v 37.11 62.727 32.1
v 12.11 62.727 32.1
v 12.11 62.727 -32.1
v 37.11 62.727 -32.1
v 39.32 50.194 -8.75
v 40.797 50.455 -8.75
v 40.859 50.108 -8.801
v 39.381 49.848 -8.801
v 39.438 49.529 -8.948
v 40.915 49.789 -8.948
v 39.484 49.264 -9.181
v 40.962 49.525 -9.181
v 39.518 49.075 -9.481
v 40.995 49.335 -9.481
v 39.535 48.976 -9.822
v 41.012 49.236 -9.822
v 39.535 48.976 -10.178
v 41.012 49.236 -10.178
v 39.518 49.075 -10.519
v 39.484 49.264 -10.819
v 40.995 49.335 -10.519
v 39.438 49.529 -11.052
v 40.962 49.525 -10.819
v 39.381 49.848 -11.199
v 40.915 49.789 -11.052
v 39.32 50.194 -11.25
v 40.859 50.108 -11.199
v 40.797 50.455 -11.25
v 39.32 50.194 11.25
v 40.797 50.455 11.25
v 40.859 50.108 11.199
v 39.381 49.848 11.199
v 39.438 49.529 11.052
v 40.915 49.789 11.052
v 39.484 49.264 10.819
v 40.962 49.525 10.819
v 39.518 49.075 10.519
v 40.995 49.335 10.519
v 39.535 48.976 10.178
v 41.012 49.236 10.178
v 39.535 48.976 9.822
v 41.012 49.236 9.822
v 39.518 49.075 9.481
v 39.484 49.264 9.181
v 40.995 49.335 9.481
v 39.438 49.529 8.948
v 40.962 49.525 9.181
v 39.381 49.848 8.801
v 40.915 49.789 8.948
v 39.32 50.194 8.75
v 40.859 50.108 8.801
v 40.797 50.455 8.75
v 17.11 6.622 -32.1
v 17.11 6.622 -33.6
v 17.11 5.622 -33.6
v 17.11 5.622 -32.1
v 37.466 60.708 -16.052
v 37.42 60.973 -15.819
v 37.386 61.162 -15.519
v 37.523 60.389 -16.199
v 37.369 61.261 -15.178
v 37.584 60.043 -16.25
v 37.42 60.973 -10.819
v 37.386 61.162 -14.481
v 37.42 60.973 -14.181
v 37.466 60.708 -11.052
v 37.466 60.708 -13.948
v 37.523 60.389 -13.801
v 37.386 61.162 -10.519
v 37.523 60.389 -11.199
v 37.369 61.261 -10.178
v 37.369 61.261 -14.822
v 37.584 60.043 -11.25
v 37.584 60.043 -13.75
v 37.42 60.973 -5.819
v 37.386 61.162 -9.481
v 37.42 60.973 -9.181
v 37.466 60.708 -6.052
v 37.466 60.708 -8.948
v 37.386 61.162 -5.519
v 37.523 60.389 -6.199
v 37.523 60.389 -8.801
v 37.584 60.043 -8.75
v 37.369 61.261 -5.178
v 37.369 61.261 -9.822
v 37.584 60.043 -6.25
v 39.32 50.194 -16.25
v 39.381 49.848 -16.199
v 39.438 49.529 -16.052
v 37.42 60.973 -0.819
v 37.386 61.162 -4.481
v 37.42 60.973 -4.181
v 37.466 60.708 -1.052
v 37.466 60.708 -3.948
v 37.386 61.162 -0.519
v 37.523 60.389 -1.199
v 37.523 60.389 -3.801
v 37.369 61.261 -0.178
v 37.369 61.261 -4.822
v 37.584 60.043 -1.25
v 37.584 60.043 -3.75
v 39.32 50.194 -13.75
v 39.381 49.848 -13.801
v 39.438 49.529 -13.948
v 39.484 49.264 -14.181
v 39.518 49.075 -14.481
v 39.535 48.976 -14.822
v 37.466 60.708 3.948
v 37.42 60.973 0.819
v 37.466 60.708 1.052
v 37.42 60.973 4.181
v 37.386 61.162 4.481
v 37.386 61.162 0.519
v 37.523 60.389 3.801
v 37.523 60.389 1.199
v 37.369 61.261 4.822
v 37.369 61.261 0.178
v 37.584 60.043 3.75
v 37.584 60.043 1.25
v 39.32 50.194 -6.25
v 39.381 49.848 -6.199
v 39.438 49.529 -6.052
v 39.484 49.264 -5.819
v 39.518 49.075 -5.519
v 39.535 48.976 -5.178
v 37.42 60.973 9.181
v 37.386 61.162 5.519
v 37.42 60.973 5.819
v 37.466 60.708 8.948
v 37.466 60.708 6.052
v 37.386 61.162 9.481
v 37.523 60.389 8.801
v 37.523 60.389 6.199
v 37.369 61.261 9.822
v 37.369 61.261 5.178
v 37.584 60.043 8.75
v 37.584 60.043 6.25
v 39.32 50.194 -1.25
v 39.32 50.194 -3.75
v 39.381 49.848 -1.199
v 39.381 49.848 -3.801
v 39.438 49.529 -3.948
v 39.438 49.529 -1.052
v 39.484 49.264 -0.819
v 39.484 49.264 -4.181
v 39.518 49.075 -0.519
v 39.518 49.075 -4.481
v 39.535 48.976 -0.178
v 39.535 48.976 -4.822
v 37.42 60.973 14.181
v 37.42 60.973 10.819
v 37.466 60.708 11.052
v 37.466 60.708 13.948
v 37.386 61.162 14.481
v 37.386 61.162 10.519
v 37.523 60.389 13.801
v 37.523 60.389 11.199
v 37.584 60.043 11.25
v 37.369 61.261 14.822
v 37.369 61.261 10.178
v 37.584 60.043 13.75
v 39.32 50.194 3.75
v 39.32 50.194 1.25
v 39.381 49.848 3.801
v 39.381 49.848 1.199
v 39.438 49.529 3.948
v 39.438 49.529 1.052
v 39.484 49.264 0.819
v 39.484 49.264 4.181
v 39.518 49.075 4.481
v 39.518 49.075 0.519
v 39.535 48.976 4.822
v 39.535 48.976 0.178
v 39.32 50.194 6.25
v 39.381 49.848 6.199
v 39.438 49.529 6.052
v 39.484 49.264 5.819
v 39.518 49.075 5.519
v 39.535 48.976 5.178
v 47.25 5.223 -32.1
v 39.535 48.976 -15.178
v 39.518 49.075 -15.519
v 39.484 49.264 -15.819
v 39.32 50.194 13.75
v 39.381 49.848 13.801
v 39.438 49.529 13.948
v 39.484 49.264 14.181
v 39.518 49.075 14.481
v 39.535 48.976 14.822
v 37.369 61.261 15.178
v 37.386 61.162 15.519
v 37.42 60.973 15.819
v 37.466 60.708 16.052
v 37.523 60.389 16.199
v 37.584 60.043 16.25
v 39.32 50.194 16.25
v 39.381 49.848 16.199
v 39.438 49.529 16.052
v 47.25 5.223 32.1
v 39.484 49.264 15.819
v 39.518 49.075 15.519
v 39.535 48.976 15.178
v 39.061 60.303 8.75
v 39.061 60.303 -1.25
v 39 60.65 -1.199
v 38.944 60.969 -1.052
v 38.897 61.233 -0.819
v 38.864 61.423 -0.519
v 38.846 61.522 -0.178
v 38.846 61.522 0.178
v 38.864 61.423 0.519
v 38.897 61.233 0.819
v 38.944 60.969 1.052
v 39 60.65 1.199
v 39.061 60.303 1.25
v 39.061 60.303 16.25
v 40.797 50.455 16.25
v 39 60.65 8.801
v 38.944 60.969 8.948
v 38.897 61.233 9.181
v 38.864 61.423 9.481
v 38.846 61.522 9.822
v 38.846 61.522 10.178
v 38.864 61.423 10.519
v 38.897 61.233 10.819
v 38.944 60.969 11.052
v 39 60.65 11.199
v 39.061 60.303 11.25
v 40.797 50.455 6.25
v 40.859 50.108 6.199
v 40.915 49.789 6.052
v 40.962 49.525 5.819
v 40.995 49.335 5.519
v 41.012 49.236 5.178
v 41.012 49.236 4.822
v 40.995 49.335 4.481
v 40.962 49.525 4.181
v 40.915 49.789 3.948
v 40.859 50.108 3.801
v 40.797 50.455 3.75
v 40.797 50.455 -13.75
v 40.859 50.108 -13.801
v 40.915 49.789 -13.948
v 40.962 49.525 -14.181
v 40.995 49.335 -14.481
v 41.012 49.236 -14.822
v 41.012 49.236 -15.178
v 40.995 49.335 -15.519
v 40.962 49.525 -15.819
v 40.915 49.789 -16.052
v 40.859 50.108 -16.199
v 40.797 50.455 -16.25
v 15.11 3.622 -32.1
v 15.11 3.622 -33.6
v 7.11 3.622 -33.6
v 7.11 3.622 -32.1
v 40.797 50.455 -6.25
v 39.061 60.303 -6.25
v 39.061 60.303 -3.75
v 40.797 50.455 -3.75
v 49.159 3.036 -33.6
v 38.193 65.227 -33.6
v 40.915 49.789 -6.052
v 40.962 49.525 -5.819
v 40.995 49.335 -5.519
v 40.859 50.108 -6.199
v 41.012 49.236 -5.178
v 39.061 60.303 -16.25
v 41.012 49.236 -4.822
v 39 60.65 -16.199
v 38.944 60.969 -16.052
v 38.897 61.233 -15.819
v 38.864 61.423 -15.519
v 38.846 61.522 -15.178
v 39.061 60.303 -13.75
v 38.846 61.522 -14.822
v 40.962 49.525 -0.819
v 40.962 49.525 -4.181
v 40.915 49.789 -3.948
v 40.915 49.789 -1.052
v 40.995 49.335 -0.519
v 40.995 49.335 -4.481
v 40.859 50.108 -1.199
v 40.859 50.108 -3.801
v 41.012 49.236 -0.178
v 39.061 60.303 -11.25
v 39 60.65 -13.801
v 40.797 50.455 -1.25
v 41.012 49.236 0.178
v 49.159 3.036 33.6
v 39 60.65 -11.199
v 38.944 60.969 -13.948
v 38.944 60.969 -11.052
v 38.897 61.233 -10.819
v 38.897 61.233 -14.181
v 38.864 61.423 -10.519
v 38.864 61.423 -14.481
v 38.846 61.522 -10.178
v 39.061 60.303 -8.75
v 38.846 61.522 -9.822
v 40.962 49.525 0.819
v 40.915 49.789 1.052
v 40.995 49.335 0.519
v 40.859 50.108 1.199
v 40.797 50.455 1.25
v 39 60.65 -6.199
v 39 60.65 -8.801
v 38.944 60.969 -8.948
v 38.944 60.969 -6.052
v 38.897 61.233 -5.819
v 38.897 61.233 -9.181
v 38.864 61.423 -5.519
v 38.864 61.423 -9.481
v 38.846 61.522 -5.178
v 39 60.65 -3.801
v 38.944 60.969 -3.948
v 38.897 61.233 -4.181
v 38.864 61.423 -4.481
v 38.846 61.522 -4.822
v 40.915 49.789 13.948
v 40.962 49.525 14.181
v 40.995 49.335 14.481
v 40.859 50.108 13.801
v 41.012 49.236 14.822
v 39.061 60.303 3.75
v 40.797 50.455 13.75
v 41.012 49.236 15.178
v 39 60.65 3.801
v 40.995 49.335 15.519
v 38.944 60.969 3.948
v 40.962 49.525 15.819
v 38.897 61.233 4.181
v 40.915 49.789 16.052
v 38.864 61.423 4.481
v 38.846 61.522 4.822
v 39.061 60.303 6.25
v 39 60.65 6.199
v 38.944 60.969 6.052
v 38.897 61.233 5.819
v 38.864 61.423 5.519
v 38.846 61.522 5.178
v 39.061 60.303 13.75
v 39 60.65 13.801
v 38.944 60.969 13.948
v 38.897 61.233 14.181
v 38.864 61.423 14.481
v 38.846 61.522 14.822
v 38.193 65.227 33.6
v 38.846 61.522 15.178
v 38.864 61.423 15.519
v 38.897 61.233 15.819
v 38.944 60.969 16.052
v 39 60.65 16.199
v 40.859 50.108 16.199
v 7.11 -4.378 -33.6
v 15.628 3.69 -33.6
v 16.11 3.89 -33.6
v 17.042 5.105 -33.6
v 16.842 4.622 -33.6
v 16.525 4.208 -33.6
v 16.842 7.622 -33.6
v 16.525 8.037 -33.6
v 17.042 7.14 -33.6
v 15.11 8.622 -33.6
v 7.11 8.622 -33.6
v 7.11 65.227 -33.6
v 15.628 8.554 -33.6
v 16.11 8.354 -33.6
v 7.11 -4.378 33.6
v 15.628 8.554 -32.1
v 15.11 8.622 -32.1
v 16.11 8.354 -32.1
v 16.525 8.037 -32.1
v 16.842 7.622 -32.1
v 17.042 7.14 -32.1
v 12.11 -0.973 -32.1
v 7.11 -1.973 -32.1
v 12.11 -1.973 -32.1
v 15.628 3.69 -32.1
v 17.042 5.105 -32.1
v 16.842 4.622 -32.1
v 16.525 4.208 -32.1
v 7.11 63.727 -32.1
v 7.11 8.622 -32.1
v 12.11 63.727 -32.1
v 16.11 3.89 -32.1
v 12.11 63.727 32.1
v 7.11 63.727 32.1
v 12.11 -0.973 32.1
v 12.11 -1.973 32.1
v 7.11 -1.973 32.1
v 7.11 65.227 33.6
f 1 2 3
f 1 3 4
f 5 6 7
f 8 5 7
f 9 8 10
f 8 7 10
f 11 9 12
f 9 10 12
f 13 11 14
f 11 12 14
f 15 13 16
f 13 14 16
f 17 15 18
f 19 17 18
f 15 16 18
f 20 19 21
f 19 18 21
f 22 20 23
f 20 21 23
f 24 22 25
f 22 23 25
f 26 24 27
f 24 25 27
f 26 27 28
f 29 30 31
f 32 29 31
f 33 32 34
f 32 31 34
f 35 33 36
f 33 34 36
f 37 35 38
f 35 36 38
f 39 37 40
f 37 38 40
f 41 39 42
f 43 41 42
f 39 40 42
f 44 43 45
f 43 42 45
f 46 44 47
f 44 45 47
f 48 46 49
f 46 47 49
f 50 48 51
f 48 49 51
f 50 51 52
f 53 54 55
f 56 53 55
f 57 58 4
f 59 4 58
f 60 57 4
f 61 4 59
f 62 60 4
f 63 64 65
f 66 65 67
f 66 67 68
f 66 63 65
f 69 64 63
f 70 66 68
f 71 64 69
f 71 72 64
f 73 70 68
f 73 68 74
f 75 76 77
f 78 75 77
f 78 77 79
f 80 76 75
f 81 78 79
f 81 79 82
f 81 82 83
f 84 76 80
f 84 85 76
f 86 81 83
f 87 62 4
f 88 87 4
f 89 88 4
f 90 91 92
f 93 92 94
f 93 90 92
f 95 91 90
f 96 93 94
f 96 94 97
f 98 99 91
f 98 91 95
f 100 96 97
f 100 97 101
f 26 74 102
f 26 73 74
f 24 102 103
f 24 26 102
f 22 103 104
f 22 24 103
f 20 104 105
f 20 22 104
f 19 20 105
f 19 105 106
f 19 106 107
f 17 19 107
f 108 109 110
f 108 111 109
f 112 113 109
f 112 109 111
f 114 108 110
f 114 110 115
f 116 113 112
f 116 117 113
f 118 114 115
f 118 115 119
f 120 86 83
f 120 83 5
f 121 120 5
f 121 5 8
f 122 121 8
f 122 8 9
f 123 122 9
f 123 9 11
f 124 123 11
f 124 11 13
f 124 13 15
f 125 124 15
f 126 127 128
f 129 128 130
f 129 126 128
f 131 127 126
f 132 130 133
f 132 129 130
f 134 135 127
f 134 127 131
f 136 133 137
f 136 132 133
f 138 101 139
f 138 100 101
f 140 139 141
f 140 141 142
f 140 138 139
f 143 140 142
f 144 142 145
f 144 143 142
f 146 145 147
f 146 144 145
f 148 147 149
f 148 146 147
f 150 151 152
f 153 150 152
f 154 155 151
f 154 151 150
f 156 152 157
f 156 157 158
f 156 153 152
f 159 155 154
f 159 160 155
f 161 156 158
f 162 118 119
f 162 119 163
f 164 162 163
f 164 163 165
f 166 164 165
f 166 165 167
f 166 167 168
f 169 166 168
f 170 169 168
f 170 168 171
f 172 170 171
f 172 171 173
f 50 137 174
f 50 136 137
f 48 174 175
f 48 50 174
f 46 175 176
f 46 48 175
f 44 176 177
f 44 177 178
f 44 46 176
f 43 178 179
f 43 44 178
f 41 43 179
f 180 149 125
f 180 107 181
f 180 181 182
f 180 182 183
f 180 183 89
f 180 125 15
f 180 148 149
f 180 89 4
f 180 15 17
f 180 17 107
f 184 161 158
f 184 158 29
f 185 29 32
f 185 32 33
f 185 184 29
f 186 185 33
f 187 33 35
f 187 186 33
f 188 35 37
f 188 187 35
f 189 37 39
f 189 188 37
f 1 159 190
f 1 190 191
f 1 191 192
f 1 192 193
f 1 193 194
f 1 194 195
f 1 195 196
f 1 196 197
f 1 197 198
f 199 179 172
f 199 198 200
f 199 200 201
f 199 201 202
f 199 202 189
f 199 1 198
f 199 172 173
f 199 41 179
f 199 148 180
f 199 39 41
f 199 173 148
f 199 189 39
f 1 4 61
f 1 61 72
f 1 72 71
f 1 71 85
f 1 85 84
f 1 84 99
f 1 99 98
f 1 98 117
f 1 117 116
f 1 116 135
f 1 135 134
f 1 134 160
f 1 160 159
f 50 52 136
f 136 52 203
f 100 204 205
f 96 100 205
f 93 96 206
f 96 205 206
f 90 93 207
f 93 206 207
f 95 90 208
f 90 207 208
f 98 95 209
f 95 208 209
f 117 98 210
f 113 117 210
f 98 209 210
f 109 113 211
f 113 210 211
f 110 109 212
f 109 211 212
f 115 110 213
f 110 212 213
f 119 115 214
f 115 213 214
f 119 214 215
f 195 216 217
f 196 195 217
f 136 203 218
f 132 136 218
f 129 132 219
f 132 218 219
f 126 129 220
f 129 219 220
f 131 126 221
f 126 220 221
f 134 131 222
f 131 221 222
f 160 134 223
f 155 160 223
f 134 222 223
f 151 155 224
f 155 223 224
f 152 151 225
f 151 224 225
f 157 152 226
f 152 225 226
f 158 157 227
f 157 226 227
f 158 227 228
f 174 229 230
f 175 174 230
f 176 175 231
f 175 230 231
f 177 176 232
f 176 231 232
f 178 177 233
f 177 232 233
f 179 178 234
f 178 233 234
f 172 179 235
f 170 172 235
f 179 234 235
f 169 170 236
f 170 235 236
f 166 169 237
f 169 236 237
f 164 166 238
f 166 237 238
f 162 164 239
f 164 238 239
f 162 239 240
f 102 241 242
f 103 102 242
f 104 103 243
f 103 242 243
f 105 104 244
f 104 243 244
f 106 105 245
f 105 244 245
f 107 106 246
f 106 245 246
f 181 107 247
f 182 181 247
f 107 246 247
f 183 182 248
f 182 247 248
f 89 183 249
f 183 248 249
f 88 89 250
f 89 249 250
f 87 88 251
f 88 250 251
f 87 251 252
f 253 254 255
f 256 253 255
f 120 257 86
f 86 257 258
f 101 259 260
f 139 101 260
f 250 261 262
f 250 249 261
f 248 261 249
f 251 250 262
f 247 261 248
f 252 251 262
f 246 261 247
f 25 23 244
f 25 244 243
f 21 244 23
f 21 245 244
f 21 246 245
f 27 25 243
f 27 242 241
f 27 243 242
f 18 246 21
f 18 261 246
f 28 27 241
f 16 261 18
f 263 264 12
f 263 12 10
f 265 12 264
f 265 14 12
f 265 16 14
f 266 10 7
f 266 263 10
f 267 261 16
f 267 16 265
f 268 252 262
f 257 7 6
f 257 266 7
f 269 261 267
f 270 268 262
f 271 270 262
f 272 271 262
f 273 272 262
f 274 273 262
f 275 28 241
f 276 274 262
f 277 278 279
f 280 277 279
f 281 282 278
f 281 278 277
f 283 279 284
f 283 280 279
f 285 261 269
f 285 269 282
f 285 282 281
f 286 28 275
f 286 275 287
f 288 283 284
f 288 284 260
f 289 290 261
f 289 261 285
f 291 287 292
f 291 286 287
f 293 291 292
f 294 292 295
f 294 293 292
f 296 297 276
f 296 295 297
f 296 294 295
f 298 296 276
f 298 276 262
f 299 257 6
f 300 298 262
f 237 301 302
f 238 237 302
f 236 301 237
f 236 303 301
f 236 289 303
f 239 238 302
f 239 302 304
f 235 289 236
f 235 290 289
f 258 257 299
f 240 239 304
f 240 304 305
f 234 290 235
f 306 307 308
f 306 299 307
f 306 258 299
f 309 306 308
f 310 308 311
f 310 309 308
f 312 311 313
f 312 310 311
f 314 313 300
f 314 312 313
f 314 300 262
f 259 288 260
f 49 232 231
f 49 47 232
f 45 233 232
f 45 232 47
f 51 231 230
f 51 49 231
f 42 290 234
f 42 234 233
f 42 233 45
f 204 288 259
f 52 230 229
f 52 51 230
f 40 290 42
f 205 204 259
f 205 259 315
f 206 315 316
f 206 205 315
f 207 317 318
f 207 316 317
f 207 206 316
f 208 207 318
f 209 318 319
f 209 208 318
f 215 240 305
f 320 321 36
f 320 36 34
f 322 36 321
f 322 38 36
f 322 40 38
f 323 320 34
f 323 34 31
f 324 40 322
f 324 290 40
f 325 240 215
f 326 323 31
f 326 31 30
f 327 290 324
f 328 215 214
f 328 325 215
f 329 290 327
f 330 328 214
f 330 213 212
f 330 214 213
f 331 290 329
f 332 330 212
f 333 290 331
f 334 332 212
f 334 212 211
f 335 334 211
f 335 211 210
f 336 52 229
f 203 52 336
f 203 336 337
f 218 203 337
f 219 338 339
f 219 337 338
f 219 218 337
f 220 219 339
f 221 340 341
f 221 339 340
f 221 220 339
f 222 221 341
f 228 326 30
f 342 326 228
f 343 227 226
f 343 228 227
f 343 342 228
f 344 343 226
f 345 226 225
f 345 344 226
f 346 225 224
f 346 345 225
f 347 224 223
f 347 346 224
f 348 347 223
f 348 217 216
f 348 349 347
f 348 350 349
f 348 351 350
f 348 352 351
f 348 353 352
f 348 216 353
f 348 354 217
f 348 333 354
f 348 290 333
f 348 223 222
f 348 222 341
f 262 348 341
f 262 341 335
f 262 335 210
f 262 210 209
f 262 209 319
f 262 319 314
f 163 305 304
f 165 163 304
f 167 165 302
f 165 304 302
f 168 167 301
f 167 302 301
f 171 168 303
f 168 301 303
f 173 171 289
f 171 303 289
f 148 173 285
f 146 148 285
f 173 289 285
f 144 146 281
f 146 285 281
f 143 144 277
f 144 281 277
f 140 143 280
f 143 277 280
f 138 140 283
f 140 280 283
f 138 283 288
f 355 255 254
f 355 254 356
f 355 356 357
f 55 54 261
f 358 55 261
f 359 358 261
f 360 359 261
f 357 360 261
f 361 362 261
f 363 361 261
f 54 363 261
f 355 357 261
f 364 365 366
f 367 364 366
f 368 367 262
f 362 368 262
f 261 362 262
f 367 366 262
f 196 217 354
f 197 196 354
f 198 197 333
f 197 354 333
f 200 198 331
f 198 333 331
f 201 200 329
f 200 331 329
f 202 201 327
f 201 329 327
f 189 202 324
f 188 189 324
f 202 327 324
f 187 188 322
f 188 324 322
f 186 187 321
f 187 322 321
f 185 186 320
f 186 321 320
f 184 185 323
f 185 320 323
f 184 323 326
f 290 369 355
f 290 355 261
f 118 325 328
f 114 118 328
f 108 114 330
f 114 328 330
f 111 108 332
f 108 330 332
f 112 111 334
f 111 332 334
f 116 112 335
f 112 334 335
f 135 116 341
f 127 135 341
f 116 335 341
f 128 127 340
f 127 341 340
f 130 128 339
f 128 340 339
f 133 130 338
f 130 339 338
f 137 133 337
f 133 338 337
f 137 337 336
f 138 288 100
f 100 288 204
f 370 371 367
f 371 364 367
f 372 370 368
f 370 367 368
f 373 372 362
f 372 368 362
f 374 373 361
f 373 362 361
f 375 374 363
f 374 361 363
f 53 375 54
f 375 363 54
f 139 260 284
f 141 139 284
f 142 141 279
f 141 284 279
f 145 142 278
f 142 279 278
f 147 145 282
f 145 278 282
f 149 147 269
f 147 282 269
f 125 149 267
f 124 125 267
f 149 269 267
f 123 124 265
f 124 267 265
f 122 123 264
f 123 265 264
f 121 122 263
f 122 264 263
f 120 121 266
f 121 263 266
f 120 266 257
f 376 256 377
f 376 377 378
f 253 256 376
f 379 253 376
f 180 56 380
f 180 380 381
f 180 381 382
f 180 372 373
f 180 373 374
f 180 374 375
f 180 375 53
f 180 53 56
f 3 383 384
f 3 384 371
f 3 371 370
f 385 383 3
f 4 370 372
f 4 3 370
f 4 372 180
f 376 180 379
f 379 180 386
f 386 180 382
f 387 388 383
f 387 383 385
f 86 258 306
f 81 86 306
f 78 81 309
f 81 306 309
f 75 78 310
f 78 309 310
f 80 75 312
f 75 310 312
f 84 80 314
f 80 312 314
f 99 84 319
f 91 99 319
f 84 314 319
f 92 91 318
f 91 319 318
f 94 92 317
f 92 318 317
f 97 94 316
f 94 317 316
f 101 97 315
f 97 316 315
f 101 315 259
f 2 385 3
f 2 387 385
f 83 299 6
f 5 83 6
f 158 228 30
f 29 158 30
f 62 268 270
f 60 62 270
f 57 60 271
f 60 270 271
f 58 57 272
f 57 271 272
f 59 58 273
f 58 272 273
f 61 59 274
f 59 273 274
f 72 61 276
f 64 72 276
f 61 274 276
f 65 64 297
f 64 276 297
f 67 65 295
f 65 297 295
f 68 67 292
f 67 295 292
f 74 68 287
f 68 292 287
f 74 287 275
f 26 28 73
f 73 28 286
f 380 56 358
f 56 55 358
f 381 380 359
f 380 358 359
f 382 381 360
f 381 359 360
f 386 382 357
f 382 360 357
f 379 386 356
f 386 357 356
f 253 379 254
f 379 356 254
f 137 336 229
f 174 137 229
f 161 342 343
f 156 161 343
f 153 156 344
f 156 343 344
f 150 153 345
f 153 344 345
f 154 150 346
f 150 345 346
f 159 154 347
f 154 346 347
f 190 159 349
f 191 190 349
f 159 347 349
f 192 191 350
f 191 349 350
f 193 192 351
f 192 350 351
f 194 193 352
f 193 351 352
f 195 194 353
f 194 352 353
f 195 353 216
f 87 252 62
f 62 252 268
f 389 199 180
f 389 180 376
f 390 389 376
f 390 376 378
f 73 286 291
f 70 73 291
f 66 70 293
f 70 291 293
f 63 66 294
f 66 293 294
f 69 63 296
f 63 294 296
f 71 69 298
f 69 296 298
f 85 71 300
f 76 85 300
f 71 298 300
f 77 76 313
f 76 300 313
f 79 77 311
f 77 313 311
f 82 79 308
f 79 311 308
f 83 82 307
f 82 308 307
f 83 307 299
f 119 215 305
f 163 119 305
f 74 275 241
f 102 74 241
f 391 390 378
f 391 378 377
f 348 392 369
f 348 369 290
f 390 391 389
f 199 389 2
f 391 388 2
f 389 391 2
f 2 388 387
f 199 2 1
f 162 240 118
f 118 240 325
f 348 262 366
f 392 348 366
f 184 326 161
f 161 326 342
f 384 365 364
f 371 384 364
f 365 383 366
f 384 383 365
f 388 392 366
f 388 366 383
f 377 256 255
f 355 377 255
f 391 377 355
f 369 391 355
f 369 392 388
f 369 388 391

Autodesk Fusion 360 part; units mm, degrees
sketch "Sketch1" plane through (0, 0, 0) normal (0, 0, 1) x (1, 0, 0)
  line L0 (7.1104, -4.3777) -> (49.1586, 3.0365)
  line L1 (49.1586, 3.0365) -> (38.1927, 65.227)
  line L2 (38.1927, 65.227) -> (7.1104, 65.227)
  line L3 (7.1104, 65.227) -> (7.1104, -4.3777)
  line L4 (7.1104, 63.727) -> (12.1104, 63.727)
  line L5 (12.1104, 63.727) -> (12.1104, -1.973)
  line L6 (12.1104, -1.973) -> (7.1104, -1.973)
  line L7 (12.1104, 62.727) -> (37.1104, 62.727)
  line L8 (37.1104, 62.727) -> (47.2499, 5.2231)
  line L9 (47.2499, 5.2231) -> (12.1104, -0.973)
  dimension "d5" = 80
  dimension "d6" = 1.5
  dimension "d8" = 5
  dimension "d9" = 65.7
  dimension "d11" = 1.5
  dimension "d12" = 1
  dimension "d13" = 1
  dimension "d40" = 1.5
  dimension "d41" = 30
extrude "Extrude4" add sketch "Sketch1" against normal blind 32.1 contours L3 L4 L5 L6 | L5 L7 L8 L9 makes body 1
extrude "Extrude3" add sketch "Sketch1" along normal blind 32.1 separate body contours L3 L4 L5 L6 | L5 L7 L8 L9 makes body 2
extrude "Extrude1" add sketch "Sketch1" along normal blind 33.6 separate body makes body 3
extrude "Extrude2" add 1 faces at (21.1265, 21.2953, 0) along direction (0, 0, -1) blind 33.6 on bodies 3 bodies 3
combine "Combine1" operation add target body 1 tool bodies 2
combine "Combine2" operation cut target body 3 tool bodies 1
sketch "Sketch2" plane through (0, 0, -33.6) normal (0, 0, -1) x (-1, 0, 0)
  line L0 (-7.1104, -4.3777) -> (-7.1104, 65.227)
  line L1 (-7.1104, 65.227) -> (-38.1927, 65.227)
  line L2 (-38.1927, 65.227) -> (-49.1586, 3.0365)
  line L3 (-49.1586, 3.0365) -> (-7.1104, -4.3777)
  line L4 (-7.1104, 8.6223) -> (-15.1104, 8.6223)
  line L5 (-17.1104, 6.6223) -> (-17.1104, 5.6223)
  line L6 (-15.1104, 3.6223) -> (-7.1104, 3.6223)
  arc A0 (-15.1104, 8.6223) -> (-17.1104, 6.6223) centre (-15.1104, 6.6223) ccw
  arc A1 (-17.1104, 5.6223) -> (-15.1104, 3.6223) centre (-15.1104, 5.6223) ccw
  line L7 (-7.1104, 65.227) -> (-7.1104, -4.3777)
  dimension "d23" = 2
  dimension "d24" = 2
  dimension "d26" = 8
  dimension "d27" = 10
  dimension "d28" = 5
extrude "Extrude5" cut sketch "Sketch2" against normal blind 1.5 contours L0 L4 L5 L6 A0 A1 L7 bodies 3
sketch "Sketch3" plane through (48.1956, 8.4982, 0) normal (0.9848, 0.1736, 0) x (0, 0, -1)
  line L0 (33.6, 57.604) -> (-33.6, 57.604)
  line L1 (-33.6, 57.604) -> (-33.6, -5.546)
  line L2 (-33.6, -5.546) -> (33.6, -5.546)
  line L3 (33.6, -5.546) -> (33.6, 57.604)
  line L4 (1.25, 42.604) -> (1.25, 52.604)
  arc A0 (1.25, 52.604) -> (-1.25, 52.604) centre (0, 52.604) ccw
  line L5 (-1.25, 52.604) -> (-1.25, 42.604)
  arc A1 (-1.25, 42.604) -> (1.25, 42.604) centre (0, 42.604) ccw
  line L6 (0, 42.604) -> (0, 52.604) construction
  line L7 (0, 57.604) -> (0, 47.604) construction
  arc A2 (-13.75, 52.604) -> (-16.25, 52.604) centre (-15, 52.604) ccw
  arc A3 (-16.25, 42.604) -> (-13.75, 42.604) centre (-15, 42.604) ccw
  line L8 (-13.75, 42.604) -> (-13.75, 52.604)
  line L9 (-16.25, 52.604) -> (-16.25, 42.604)
  arc A4 (-8.75, 52.604) -> (-11.25, 52.604) centre (-10, 52.604) ccw
  arc A5 (-11.25, 42.604) -> (-8.75, 42.604) centre (-10, 42.604) ccw
  line L10 (-8.75, 42.604) -> (-8.75, 52.604)
  line L11 (-11.25, 52.604) -> (-11.25, 42.604)
  arc A6 (-3.75, 52.604) -> (-6.25, 52.604) centre (-5, 52.604) ccw
  arc A7 (-6.25, 42.604) -> (-3.75, 42.604) centre (-5, 42.604) ccw
  line L12 (-3.75, 42.604) -> (-3.75, 52.604)
  line L13 (-6.25, 52.604) -> (-6.25, 42.604)
  arc A8 (6.25, 52.604) -> (3.75, 52.604) centre (5, 52.604) ccw
  arc A9 (3.75, 42.604) -> (6.25, 42.604) centre (5, 42.604) ccw
  line L14 (6.25, 42.604) -> (6.25, 52.604)
  line L15 (3.75, 52.604) -> (3.75, 42.604)
  arc A10 (11.25, 52.604) -> (8.75, 52.604) centre (10, 52.604) ccw
  arc A11 (8.75, 42.604) -> (11.25, 42.604) centre (10, 42.604) ccw
  line L16 (11.25, 42.604) -> (11.25, 52.604)
  line L17 (8.75, 52.604) -> (8.75, 42.604)
  arc A12 (16.25, 52.604) -> (13.75, 52.604) centre (15, 52.604) ccw
  arc A13 (13.75, 42.604) -> (16.25, 42.604) centre (15, 42.604) ccw
  line L18 (16.25, 42.604) -> (16.25, 52.604)
  line L19 (13.75, 52.604) -> (13.75, 42.604)
  point P0 (0, 47.604)
  dimension "d31" = 2.5
  dimension "d32" = 10
  dimension "d33" = 10
  dimension "d36" = 5
  dimension "d37" = 0
extrude "Extrude6" cut sketch "Sketch3" against normal blind 1.5 contours L4 A0 L5 A1 | A2 A3 L8 L9 | A4 A5 L10 L11 | A6 A7 L12 L13 | A8 A9 L14 L15 | A10 A11 L16 L17 | A12 A13 L18 L19 bodies 3
equation "wall_thickness = 1.5 mm"
equation "d6 = wall_thickness"
equation "d9 = 64.2 mm + wall_thickness"
equation "d11 = wall_thickness"
equation "d14 = 32.1 mm + wall_thickness"
equation "d16 = 32.1 mm + wall_thickness"
equation "d40 = wall_thickness"
